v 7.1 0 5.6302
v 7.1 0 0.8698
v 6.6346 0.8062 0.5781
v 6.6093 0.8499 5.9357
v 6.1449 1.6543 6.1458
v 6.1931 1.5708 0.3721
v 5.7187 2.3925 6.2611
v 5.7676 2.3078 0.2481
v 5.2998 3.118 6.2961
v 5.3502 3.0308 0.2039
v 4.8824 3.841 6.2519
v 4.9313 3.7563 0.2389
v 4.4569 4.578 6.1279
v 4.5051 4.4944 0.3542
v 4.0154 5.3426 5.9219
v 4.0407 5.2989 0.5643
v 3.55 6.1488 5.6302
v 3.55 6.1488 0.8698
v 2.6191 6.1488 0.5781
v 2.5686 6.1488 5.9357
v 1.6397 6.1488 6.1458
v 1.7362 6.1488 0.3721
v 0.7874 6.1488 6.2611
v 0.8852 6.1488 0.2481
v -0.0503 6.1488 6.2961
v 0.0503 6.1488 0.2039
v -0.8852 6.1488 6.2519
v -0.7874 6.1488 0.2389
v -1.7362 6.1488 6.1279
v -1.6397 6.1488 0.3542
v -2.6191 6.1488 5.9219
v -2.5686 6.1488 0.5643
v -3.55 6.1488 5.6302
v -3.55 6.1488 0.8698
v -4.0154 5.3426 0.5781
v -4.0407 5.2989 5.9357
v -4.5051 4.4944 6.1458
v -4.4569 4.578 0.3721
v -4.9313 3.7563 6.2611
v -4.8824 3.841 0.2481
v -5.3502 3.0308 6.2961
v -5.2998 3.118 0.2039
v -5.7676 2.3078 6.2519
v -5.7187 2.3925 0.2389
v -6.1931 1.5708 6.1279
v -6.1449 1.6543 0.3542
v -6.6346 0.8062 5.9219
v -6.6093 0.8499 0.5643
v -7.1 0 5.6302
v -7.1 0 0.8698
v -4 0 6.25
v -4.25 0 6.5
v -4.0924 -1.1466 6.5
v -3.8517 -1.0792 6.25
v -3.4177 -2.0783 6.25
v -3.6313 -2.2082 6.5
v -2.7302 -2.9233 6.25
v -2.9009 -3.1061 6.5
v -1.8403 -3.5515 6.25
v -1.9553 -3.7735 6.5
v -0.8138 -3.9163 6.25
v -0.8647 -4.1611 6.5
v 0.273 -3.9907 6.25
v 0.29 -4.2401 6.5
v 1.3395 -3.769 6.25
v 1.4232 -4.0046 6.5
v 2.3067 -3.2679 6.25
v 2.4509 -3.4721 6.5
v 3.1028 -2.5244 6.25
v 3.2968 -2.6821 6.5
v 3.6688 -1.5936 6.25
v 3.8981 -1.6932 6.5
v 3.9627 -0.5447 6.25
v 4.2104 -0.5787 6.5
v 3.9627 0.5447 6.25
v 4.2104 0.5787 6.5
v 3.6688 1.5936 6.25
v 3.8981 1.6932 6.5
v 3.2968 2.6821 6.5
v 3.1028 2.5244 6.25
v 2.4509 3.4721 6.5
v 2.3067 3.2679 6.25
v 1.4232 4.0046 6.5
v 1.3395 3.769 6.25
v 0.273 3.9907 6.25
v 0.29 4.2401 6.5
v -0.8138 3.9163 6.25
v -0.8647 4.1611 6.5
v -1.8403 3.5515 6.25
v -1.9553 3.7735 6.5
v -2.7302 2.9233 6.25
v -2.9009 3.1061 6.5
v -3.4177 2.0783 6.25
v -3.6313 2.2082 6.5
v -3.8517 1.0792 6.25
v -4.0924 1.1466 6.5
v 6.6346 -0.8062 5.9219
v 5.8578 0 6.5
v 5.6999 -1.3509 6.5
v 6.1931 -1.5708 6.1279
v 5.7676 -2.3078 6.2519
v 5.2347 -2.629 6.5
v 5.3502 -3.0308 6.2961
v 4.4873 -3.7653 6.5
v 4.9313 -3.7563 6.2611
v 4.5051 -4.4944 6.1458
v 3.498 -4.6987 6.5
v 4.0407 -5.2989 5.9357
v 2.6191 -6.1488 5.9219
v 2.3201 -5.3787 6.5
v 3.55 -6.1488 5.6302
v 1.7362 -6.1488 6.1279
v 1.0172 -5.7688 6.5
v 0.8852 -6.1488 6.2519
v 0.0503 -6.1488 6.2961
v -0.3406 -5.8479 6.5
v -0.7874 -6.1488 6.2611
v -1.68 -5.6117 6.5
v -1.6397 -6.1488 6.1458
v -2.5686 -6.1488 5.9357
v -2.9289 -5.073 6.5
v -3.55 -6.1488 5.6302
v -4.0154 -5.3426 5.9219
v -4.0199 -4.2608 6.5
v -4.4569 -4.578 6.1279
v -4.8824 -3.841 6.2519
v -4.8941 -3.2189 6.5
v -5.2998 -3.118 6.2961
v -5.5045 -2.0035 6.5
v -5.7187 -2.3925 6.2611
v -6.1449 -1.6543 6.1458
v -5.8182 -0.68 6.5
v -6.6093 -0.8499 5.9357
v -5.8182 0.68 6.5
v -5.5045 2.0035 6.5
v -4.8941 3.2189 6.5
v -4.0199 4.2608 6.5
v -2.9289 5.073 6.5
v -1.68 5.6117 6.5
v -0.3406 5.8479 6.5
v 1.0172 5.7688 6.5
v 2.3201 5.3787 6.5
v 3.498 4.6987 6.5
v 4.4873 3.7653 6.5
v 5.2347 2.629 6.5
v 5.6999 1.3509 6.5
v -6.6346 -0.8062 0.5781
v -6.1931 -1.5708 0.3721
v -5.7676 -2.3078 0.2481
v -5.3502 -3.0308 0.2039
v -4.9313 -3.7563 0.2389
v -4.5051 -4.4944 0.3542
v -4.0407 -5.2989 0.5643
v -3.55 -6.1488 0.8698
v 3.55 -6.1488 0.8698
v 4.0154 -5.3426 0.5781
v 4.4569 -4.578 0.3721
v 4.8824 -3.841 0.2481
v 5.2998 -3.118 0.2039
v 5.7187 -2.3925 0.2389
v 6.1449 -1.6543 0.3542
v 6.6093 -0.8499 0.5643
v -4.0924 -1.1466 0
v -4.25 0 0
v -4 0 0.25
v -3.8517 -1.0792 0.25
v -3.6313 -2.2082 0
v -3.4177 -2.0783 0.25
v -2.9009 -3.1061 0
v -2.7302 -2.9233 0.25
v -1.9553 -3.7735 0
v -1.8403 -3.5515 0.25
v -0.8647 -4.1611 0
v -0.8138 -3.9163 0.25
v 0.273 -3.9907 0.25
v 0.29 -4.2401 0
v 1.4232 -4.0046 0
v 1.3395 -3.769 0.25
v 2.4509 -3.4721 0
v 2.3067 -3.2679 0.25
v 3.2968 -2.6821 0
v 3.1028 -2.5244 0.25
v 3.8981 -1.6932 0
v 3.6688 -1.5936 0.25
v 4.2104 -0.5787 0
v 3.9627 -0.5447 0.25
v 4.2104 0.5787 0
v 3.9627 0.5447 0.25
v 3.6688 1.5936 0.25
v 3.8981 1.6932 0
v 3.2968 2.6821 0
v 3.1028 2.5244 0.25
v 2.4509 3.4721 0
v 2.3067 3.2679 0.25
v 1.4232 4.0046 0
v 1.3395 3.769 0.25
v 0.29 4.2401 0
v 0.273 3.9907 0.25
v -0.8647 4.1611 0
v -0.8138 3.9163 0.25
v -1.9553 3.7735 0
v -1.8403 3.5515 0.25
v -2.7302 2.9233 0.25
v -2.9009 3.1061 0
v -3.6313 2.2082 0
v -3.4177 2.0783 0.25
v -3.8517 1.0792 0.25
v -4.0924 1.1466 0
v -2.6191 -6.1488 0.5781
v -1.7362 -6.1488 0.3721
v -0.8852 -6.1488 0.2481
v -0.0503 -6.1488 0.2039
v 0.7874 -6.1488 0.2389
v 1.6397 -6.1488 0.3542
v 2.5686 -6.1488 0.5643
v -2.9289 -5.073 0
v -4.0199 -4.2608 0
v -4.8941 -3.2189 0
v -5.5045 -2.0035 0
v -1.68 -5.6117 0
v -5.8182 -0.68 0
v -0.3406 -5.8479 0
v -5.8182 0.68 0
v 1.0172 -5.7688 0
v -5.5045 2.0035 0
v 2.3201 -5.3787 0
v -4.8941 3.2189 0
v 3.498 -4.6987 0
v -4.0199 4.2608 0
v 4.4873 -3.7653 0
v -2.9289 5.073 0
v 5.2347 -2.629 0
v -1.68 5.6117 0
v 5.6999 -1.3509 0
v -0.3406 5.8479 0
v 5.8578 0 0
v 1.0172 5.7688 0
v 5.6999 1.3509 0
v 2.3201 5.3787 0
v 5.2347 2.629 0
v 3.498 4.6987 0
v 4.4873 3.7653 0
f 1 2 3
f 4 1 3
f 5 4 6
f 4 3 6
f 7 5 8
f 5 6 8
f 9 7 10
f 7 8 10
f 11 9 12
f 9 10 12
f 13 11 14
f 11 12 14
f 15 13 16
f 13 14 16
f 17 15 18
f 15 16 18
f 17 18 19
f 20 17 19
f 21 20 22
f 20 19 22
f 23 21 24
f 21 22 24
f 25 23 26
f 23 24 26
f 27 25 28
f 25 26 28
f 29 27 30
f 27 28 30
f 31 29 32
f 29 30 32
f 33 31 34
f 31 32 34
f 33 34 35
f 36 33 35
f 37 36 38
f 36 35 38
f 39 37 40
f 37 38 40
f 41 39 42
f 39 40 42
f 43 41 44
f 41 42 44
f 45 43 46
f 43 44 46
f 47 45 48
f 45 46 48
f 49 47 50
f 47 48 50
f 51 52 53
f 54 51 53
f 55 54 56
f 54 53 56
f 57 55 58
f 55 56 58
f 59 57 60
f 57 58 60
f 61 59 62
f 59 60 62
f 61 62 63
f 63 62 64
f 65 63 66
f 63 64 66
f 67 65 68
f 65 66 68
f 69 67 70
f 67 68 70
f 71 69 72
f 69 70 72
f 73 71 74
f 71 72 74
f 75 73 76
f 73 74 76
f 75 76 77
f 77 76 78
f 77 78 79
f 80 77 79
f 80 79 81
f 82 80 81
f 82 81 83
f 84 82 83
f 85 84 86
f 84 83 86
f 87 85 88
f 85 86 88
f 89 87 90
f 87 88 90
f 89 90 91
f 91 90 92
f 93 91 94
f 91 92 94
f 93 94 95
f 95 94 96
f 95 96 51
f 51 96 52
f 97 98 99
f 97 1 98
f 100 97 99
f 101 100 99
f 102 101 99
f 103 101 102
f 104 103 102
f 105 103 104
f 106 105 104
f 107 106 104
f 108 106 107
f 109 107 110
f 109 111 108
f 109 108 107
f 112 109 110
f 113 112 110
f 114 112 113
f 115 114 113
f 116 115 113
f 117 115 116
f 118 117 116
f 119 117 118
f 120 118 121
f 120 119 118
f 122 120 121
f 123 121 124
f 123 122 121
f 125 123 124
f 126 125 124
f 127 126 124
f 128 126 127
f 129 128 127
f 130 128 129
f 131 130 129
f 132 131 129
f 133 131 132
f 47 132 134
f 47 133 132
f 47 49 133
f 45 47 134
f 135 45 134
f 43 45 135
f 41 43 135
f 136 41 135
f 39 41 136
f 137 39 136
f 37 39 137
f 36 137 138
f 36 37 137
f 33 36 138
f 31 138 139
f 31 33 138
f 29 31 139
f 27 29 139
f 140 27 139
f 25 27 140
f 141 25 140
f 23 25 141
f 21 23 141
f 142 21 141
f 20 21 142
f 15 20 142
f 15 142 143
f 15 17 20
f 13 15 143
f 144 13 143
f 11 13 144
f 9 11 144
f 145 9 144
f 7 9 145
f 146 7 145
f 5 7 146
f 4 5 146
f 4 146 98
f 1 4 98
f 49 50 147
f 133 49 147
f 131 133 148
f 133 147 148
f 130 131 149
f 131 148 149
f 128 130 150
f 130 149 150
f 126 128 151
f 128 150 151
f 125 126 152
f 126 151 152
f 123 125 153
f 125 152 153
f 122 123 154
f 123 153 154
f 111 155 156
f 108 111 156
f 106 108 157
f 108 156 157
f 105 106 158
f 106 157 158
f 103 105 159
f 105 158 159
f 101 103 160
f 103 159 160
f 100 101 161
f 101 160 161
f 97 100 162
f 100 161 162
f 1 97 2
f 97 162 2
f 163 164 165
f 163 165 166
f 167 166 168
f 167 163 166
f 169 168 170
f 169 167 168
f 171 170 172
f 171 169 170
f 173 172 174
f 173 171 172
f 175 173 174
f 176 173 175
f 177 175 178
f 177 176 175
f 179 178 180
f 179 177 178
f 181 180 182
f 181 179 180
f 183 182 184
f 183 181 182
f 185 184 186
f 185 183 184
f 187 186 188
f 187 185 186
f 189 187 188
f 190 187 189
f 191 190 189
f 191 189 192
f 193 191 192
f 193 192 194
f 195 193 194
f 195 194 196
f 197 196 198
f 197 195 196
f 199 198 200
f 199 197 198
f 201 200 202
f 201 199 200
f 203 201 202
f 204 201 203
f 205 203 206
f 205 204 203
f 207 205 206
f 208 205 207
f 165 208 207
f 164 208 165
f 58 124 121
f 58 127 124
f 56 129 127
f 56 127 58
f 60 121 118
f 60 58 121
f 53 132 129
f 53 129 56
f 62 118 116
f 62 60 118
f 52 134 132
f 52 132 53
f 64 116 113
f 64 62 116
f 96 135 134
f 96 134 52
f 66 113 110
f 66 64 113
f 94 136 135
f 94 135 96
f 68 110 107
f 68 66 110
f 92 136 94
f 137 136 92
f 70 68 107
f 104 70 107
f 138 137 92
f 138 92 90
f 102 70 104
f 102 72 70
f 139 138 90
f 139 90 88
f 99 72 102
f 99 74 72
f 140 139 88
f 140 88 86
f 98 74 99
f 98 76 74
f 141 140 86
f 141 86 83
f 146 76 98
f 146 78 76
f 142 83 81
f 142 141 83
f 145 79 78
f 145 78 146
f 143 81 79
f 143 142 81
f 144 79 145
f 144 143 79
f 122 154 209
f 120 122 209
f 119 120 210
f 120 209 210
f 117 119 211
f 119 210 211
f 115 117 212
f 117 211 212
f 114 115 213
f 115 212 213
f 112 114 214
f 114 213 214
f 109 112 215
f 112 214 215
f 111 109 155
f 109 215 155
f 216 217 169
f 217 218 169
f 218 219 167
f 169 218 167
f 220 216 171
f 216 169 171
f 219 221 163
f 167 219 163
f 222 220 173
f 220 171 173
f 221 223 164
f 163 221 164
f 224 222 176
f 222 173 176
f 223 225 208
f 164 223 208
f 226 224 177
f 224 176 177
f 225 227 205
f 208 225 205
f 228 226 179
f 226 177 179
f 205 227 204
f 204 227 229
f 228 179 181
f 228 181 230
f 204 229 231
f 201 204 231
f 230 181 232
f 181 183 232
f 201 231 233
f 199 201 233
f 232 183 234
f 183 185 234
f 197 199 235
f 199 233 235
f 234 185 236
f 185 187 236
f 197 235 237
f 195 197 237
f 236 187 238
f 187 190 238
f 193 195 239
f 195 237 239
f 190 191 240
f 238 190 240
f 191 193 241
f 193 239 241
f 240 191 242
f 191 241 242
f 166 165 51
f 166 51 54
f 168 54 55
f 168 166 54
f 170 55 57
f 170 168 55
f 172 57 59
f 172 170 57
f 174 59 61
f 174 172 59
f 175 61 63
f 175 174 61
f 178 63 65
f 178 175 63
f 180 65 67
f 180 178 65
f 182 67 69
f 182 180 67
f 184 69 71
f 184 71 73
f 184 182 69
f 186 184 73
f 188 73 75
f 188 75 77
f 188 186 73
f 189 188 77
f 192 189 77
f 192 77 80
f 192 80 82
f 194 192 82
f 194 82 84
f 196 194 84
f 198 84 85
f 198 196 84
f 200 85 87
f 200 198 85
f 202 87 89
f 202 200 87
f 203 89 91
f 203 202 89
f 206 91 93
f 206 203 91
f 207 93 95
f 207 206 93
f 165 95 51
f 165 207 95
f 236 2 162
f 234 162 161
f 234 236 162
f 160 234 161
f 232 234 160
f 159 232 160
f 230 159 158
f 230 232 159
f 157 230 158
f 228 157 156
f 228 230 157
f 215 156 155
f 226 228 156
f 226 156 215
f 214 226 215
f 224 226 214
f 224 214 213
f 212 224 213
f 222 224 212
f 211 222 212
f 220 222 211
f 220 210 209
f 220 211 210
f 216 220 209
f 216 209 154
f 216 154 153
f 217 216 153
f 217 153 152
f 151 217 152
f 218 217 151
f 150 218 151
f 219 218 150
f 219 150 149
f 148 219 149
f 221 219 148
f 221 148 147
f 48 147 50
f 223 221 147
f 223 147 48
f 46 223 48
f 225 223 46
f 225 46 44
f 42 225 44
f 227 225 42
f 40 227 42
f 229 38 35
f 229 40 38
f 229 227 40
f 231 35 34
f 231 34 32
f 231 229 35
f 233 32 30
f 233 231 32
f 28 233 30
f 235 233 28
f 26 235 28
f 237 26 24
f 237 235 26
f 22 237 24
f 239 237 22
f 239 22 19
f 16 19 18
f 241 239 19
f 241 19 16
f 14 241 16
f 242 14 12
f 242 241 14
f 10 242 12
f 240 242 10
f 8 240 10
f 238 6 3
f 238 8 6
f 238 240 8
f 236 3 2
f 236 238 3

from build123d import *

# Parameters (mm, degrees)
SKETCH1_R           = 4
BOSS_EXTRUDE1_DEPTH = 6.5
CHAMFER1_SIZE       = 0.25


with BuildPart() as part:
    # Sketch1 → Boss-Extrude1 (new body)
    with BuildSketch(Plane.XY):
        Polygon((7.1, 0), (3.55, 6.148780367), (-3.55, 6.148780367), (-7.1, 0), (-3.55, -6.148780367), (3.55, -6.148780367), align=None)
        with Locations(Location((0, 0, 0), (0, 0, 180))):
            Circle(SKETCH1_R, mode=Mode.SUBTRACT)
    extrude(amount=BOSS_EXTRUDE1_DEPTH)

    # Chamfer1
    chamfer1_edges = [part.edges().sort_by_distance(p)[0] for p in [
        (4, 0, 0),
        (4, 0, 6.5),
    ]]
    chamfer(chamfer1_edges, length=CHAMFER1_SIZE)

    # Sketch3 → Cut-Revolve1 (revolve, cut)
    with BuildSketch(Plane(origin=(0, 0, 0), x_dir=(1, 0, 0), z_dir=(0, 1, 0)), mode=Mode.PRIVATE) as cut_revolve1_sk:
        Polygon((-1, -7.5), (-4.429629983, -7.5), (-8, -5), (-8, -1.5), (-4.429629983, 1), (-1, 1), (-1, 1.925478013), (-9.540810572, 1.925478013), (-9.540810572, -8.900626742), (-1, -8.900626742), align=None)
    revolve(cut_revolve1_sk.sketch.rotate(Axis((0, 0, 7.5), (0, 0, -1)), 180), axis=Axis((0, 0, 7.5), (0, 0, -1)), mode=Mode.SUBTRACT)


solid = part.part
